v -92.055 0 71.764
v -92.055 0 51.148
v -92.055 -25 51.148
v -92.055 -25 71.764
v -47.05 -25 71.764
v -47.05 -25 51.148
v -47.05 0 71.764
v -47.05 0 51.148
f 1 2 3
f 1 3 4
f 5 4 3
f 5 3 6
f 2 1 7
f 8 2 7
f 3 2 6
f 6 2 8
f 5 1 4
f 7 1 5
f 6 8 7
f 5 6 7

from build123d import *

# Parameters (mm, degrees)
F0_R     = 27.8864811647
F1_DEPTH = 25
F0_W     = 45.0044758618
F0_H     = 20.6155590713


with BuildPart() as f1:
    # F0 (on Front) → F1 (new body)
    with BuildSketch(Plane.XZ):
        with Locations((-136.4746242762, 8.3838962018)):
            Circle(F0_R)
    extrude(amount=F1_DEPTH)


with BuildPart() as f1b:
    # F0 (on Front) → F1, piece 2 (new body)
    with BuildSketch(Plane.XZ):
        with Locations((-69.5523750037, 61.4560414106)):
            Rectangle(F0_W, F0_H)
    extrude(amount=F1_DEPTH)


solid = f1b.part
